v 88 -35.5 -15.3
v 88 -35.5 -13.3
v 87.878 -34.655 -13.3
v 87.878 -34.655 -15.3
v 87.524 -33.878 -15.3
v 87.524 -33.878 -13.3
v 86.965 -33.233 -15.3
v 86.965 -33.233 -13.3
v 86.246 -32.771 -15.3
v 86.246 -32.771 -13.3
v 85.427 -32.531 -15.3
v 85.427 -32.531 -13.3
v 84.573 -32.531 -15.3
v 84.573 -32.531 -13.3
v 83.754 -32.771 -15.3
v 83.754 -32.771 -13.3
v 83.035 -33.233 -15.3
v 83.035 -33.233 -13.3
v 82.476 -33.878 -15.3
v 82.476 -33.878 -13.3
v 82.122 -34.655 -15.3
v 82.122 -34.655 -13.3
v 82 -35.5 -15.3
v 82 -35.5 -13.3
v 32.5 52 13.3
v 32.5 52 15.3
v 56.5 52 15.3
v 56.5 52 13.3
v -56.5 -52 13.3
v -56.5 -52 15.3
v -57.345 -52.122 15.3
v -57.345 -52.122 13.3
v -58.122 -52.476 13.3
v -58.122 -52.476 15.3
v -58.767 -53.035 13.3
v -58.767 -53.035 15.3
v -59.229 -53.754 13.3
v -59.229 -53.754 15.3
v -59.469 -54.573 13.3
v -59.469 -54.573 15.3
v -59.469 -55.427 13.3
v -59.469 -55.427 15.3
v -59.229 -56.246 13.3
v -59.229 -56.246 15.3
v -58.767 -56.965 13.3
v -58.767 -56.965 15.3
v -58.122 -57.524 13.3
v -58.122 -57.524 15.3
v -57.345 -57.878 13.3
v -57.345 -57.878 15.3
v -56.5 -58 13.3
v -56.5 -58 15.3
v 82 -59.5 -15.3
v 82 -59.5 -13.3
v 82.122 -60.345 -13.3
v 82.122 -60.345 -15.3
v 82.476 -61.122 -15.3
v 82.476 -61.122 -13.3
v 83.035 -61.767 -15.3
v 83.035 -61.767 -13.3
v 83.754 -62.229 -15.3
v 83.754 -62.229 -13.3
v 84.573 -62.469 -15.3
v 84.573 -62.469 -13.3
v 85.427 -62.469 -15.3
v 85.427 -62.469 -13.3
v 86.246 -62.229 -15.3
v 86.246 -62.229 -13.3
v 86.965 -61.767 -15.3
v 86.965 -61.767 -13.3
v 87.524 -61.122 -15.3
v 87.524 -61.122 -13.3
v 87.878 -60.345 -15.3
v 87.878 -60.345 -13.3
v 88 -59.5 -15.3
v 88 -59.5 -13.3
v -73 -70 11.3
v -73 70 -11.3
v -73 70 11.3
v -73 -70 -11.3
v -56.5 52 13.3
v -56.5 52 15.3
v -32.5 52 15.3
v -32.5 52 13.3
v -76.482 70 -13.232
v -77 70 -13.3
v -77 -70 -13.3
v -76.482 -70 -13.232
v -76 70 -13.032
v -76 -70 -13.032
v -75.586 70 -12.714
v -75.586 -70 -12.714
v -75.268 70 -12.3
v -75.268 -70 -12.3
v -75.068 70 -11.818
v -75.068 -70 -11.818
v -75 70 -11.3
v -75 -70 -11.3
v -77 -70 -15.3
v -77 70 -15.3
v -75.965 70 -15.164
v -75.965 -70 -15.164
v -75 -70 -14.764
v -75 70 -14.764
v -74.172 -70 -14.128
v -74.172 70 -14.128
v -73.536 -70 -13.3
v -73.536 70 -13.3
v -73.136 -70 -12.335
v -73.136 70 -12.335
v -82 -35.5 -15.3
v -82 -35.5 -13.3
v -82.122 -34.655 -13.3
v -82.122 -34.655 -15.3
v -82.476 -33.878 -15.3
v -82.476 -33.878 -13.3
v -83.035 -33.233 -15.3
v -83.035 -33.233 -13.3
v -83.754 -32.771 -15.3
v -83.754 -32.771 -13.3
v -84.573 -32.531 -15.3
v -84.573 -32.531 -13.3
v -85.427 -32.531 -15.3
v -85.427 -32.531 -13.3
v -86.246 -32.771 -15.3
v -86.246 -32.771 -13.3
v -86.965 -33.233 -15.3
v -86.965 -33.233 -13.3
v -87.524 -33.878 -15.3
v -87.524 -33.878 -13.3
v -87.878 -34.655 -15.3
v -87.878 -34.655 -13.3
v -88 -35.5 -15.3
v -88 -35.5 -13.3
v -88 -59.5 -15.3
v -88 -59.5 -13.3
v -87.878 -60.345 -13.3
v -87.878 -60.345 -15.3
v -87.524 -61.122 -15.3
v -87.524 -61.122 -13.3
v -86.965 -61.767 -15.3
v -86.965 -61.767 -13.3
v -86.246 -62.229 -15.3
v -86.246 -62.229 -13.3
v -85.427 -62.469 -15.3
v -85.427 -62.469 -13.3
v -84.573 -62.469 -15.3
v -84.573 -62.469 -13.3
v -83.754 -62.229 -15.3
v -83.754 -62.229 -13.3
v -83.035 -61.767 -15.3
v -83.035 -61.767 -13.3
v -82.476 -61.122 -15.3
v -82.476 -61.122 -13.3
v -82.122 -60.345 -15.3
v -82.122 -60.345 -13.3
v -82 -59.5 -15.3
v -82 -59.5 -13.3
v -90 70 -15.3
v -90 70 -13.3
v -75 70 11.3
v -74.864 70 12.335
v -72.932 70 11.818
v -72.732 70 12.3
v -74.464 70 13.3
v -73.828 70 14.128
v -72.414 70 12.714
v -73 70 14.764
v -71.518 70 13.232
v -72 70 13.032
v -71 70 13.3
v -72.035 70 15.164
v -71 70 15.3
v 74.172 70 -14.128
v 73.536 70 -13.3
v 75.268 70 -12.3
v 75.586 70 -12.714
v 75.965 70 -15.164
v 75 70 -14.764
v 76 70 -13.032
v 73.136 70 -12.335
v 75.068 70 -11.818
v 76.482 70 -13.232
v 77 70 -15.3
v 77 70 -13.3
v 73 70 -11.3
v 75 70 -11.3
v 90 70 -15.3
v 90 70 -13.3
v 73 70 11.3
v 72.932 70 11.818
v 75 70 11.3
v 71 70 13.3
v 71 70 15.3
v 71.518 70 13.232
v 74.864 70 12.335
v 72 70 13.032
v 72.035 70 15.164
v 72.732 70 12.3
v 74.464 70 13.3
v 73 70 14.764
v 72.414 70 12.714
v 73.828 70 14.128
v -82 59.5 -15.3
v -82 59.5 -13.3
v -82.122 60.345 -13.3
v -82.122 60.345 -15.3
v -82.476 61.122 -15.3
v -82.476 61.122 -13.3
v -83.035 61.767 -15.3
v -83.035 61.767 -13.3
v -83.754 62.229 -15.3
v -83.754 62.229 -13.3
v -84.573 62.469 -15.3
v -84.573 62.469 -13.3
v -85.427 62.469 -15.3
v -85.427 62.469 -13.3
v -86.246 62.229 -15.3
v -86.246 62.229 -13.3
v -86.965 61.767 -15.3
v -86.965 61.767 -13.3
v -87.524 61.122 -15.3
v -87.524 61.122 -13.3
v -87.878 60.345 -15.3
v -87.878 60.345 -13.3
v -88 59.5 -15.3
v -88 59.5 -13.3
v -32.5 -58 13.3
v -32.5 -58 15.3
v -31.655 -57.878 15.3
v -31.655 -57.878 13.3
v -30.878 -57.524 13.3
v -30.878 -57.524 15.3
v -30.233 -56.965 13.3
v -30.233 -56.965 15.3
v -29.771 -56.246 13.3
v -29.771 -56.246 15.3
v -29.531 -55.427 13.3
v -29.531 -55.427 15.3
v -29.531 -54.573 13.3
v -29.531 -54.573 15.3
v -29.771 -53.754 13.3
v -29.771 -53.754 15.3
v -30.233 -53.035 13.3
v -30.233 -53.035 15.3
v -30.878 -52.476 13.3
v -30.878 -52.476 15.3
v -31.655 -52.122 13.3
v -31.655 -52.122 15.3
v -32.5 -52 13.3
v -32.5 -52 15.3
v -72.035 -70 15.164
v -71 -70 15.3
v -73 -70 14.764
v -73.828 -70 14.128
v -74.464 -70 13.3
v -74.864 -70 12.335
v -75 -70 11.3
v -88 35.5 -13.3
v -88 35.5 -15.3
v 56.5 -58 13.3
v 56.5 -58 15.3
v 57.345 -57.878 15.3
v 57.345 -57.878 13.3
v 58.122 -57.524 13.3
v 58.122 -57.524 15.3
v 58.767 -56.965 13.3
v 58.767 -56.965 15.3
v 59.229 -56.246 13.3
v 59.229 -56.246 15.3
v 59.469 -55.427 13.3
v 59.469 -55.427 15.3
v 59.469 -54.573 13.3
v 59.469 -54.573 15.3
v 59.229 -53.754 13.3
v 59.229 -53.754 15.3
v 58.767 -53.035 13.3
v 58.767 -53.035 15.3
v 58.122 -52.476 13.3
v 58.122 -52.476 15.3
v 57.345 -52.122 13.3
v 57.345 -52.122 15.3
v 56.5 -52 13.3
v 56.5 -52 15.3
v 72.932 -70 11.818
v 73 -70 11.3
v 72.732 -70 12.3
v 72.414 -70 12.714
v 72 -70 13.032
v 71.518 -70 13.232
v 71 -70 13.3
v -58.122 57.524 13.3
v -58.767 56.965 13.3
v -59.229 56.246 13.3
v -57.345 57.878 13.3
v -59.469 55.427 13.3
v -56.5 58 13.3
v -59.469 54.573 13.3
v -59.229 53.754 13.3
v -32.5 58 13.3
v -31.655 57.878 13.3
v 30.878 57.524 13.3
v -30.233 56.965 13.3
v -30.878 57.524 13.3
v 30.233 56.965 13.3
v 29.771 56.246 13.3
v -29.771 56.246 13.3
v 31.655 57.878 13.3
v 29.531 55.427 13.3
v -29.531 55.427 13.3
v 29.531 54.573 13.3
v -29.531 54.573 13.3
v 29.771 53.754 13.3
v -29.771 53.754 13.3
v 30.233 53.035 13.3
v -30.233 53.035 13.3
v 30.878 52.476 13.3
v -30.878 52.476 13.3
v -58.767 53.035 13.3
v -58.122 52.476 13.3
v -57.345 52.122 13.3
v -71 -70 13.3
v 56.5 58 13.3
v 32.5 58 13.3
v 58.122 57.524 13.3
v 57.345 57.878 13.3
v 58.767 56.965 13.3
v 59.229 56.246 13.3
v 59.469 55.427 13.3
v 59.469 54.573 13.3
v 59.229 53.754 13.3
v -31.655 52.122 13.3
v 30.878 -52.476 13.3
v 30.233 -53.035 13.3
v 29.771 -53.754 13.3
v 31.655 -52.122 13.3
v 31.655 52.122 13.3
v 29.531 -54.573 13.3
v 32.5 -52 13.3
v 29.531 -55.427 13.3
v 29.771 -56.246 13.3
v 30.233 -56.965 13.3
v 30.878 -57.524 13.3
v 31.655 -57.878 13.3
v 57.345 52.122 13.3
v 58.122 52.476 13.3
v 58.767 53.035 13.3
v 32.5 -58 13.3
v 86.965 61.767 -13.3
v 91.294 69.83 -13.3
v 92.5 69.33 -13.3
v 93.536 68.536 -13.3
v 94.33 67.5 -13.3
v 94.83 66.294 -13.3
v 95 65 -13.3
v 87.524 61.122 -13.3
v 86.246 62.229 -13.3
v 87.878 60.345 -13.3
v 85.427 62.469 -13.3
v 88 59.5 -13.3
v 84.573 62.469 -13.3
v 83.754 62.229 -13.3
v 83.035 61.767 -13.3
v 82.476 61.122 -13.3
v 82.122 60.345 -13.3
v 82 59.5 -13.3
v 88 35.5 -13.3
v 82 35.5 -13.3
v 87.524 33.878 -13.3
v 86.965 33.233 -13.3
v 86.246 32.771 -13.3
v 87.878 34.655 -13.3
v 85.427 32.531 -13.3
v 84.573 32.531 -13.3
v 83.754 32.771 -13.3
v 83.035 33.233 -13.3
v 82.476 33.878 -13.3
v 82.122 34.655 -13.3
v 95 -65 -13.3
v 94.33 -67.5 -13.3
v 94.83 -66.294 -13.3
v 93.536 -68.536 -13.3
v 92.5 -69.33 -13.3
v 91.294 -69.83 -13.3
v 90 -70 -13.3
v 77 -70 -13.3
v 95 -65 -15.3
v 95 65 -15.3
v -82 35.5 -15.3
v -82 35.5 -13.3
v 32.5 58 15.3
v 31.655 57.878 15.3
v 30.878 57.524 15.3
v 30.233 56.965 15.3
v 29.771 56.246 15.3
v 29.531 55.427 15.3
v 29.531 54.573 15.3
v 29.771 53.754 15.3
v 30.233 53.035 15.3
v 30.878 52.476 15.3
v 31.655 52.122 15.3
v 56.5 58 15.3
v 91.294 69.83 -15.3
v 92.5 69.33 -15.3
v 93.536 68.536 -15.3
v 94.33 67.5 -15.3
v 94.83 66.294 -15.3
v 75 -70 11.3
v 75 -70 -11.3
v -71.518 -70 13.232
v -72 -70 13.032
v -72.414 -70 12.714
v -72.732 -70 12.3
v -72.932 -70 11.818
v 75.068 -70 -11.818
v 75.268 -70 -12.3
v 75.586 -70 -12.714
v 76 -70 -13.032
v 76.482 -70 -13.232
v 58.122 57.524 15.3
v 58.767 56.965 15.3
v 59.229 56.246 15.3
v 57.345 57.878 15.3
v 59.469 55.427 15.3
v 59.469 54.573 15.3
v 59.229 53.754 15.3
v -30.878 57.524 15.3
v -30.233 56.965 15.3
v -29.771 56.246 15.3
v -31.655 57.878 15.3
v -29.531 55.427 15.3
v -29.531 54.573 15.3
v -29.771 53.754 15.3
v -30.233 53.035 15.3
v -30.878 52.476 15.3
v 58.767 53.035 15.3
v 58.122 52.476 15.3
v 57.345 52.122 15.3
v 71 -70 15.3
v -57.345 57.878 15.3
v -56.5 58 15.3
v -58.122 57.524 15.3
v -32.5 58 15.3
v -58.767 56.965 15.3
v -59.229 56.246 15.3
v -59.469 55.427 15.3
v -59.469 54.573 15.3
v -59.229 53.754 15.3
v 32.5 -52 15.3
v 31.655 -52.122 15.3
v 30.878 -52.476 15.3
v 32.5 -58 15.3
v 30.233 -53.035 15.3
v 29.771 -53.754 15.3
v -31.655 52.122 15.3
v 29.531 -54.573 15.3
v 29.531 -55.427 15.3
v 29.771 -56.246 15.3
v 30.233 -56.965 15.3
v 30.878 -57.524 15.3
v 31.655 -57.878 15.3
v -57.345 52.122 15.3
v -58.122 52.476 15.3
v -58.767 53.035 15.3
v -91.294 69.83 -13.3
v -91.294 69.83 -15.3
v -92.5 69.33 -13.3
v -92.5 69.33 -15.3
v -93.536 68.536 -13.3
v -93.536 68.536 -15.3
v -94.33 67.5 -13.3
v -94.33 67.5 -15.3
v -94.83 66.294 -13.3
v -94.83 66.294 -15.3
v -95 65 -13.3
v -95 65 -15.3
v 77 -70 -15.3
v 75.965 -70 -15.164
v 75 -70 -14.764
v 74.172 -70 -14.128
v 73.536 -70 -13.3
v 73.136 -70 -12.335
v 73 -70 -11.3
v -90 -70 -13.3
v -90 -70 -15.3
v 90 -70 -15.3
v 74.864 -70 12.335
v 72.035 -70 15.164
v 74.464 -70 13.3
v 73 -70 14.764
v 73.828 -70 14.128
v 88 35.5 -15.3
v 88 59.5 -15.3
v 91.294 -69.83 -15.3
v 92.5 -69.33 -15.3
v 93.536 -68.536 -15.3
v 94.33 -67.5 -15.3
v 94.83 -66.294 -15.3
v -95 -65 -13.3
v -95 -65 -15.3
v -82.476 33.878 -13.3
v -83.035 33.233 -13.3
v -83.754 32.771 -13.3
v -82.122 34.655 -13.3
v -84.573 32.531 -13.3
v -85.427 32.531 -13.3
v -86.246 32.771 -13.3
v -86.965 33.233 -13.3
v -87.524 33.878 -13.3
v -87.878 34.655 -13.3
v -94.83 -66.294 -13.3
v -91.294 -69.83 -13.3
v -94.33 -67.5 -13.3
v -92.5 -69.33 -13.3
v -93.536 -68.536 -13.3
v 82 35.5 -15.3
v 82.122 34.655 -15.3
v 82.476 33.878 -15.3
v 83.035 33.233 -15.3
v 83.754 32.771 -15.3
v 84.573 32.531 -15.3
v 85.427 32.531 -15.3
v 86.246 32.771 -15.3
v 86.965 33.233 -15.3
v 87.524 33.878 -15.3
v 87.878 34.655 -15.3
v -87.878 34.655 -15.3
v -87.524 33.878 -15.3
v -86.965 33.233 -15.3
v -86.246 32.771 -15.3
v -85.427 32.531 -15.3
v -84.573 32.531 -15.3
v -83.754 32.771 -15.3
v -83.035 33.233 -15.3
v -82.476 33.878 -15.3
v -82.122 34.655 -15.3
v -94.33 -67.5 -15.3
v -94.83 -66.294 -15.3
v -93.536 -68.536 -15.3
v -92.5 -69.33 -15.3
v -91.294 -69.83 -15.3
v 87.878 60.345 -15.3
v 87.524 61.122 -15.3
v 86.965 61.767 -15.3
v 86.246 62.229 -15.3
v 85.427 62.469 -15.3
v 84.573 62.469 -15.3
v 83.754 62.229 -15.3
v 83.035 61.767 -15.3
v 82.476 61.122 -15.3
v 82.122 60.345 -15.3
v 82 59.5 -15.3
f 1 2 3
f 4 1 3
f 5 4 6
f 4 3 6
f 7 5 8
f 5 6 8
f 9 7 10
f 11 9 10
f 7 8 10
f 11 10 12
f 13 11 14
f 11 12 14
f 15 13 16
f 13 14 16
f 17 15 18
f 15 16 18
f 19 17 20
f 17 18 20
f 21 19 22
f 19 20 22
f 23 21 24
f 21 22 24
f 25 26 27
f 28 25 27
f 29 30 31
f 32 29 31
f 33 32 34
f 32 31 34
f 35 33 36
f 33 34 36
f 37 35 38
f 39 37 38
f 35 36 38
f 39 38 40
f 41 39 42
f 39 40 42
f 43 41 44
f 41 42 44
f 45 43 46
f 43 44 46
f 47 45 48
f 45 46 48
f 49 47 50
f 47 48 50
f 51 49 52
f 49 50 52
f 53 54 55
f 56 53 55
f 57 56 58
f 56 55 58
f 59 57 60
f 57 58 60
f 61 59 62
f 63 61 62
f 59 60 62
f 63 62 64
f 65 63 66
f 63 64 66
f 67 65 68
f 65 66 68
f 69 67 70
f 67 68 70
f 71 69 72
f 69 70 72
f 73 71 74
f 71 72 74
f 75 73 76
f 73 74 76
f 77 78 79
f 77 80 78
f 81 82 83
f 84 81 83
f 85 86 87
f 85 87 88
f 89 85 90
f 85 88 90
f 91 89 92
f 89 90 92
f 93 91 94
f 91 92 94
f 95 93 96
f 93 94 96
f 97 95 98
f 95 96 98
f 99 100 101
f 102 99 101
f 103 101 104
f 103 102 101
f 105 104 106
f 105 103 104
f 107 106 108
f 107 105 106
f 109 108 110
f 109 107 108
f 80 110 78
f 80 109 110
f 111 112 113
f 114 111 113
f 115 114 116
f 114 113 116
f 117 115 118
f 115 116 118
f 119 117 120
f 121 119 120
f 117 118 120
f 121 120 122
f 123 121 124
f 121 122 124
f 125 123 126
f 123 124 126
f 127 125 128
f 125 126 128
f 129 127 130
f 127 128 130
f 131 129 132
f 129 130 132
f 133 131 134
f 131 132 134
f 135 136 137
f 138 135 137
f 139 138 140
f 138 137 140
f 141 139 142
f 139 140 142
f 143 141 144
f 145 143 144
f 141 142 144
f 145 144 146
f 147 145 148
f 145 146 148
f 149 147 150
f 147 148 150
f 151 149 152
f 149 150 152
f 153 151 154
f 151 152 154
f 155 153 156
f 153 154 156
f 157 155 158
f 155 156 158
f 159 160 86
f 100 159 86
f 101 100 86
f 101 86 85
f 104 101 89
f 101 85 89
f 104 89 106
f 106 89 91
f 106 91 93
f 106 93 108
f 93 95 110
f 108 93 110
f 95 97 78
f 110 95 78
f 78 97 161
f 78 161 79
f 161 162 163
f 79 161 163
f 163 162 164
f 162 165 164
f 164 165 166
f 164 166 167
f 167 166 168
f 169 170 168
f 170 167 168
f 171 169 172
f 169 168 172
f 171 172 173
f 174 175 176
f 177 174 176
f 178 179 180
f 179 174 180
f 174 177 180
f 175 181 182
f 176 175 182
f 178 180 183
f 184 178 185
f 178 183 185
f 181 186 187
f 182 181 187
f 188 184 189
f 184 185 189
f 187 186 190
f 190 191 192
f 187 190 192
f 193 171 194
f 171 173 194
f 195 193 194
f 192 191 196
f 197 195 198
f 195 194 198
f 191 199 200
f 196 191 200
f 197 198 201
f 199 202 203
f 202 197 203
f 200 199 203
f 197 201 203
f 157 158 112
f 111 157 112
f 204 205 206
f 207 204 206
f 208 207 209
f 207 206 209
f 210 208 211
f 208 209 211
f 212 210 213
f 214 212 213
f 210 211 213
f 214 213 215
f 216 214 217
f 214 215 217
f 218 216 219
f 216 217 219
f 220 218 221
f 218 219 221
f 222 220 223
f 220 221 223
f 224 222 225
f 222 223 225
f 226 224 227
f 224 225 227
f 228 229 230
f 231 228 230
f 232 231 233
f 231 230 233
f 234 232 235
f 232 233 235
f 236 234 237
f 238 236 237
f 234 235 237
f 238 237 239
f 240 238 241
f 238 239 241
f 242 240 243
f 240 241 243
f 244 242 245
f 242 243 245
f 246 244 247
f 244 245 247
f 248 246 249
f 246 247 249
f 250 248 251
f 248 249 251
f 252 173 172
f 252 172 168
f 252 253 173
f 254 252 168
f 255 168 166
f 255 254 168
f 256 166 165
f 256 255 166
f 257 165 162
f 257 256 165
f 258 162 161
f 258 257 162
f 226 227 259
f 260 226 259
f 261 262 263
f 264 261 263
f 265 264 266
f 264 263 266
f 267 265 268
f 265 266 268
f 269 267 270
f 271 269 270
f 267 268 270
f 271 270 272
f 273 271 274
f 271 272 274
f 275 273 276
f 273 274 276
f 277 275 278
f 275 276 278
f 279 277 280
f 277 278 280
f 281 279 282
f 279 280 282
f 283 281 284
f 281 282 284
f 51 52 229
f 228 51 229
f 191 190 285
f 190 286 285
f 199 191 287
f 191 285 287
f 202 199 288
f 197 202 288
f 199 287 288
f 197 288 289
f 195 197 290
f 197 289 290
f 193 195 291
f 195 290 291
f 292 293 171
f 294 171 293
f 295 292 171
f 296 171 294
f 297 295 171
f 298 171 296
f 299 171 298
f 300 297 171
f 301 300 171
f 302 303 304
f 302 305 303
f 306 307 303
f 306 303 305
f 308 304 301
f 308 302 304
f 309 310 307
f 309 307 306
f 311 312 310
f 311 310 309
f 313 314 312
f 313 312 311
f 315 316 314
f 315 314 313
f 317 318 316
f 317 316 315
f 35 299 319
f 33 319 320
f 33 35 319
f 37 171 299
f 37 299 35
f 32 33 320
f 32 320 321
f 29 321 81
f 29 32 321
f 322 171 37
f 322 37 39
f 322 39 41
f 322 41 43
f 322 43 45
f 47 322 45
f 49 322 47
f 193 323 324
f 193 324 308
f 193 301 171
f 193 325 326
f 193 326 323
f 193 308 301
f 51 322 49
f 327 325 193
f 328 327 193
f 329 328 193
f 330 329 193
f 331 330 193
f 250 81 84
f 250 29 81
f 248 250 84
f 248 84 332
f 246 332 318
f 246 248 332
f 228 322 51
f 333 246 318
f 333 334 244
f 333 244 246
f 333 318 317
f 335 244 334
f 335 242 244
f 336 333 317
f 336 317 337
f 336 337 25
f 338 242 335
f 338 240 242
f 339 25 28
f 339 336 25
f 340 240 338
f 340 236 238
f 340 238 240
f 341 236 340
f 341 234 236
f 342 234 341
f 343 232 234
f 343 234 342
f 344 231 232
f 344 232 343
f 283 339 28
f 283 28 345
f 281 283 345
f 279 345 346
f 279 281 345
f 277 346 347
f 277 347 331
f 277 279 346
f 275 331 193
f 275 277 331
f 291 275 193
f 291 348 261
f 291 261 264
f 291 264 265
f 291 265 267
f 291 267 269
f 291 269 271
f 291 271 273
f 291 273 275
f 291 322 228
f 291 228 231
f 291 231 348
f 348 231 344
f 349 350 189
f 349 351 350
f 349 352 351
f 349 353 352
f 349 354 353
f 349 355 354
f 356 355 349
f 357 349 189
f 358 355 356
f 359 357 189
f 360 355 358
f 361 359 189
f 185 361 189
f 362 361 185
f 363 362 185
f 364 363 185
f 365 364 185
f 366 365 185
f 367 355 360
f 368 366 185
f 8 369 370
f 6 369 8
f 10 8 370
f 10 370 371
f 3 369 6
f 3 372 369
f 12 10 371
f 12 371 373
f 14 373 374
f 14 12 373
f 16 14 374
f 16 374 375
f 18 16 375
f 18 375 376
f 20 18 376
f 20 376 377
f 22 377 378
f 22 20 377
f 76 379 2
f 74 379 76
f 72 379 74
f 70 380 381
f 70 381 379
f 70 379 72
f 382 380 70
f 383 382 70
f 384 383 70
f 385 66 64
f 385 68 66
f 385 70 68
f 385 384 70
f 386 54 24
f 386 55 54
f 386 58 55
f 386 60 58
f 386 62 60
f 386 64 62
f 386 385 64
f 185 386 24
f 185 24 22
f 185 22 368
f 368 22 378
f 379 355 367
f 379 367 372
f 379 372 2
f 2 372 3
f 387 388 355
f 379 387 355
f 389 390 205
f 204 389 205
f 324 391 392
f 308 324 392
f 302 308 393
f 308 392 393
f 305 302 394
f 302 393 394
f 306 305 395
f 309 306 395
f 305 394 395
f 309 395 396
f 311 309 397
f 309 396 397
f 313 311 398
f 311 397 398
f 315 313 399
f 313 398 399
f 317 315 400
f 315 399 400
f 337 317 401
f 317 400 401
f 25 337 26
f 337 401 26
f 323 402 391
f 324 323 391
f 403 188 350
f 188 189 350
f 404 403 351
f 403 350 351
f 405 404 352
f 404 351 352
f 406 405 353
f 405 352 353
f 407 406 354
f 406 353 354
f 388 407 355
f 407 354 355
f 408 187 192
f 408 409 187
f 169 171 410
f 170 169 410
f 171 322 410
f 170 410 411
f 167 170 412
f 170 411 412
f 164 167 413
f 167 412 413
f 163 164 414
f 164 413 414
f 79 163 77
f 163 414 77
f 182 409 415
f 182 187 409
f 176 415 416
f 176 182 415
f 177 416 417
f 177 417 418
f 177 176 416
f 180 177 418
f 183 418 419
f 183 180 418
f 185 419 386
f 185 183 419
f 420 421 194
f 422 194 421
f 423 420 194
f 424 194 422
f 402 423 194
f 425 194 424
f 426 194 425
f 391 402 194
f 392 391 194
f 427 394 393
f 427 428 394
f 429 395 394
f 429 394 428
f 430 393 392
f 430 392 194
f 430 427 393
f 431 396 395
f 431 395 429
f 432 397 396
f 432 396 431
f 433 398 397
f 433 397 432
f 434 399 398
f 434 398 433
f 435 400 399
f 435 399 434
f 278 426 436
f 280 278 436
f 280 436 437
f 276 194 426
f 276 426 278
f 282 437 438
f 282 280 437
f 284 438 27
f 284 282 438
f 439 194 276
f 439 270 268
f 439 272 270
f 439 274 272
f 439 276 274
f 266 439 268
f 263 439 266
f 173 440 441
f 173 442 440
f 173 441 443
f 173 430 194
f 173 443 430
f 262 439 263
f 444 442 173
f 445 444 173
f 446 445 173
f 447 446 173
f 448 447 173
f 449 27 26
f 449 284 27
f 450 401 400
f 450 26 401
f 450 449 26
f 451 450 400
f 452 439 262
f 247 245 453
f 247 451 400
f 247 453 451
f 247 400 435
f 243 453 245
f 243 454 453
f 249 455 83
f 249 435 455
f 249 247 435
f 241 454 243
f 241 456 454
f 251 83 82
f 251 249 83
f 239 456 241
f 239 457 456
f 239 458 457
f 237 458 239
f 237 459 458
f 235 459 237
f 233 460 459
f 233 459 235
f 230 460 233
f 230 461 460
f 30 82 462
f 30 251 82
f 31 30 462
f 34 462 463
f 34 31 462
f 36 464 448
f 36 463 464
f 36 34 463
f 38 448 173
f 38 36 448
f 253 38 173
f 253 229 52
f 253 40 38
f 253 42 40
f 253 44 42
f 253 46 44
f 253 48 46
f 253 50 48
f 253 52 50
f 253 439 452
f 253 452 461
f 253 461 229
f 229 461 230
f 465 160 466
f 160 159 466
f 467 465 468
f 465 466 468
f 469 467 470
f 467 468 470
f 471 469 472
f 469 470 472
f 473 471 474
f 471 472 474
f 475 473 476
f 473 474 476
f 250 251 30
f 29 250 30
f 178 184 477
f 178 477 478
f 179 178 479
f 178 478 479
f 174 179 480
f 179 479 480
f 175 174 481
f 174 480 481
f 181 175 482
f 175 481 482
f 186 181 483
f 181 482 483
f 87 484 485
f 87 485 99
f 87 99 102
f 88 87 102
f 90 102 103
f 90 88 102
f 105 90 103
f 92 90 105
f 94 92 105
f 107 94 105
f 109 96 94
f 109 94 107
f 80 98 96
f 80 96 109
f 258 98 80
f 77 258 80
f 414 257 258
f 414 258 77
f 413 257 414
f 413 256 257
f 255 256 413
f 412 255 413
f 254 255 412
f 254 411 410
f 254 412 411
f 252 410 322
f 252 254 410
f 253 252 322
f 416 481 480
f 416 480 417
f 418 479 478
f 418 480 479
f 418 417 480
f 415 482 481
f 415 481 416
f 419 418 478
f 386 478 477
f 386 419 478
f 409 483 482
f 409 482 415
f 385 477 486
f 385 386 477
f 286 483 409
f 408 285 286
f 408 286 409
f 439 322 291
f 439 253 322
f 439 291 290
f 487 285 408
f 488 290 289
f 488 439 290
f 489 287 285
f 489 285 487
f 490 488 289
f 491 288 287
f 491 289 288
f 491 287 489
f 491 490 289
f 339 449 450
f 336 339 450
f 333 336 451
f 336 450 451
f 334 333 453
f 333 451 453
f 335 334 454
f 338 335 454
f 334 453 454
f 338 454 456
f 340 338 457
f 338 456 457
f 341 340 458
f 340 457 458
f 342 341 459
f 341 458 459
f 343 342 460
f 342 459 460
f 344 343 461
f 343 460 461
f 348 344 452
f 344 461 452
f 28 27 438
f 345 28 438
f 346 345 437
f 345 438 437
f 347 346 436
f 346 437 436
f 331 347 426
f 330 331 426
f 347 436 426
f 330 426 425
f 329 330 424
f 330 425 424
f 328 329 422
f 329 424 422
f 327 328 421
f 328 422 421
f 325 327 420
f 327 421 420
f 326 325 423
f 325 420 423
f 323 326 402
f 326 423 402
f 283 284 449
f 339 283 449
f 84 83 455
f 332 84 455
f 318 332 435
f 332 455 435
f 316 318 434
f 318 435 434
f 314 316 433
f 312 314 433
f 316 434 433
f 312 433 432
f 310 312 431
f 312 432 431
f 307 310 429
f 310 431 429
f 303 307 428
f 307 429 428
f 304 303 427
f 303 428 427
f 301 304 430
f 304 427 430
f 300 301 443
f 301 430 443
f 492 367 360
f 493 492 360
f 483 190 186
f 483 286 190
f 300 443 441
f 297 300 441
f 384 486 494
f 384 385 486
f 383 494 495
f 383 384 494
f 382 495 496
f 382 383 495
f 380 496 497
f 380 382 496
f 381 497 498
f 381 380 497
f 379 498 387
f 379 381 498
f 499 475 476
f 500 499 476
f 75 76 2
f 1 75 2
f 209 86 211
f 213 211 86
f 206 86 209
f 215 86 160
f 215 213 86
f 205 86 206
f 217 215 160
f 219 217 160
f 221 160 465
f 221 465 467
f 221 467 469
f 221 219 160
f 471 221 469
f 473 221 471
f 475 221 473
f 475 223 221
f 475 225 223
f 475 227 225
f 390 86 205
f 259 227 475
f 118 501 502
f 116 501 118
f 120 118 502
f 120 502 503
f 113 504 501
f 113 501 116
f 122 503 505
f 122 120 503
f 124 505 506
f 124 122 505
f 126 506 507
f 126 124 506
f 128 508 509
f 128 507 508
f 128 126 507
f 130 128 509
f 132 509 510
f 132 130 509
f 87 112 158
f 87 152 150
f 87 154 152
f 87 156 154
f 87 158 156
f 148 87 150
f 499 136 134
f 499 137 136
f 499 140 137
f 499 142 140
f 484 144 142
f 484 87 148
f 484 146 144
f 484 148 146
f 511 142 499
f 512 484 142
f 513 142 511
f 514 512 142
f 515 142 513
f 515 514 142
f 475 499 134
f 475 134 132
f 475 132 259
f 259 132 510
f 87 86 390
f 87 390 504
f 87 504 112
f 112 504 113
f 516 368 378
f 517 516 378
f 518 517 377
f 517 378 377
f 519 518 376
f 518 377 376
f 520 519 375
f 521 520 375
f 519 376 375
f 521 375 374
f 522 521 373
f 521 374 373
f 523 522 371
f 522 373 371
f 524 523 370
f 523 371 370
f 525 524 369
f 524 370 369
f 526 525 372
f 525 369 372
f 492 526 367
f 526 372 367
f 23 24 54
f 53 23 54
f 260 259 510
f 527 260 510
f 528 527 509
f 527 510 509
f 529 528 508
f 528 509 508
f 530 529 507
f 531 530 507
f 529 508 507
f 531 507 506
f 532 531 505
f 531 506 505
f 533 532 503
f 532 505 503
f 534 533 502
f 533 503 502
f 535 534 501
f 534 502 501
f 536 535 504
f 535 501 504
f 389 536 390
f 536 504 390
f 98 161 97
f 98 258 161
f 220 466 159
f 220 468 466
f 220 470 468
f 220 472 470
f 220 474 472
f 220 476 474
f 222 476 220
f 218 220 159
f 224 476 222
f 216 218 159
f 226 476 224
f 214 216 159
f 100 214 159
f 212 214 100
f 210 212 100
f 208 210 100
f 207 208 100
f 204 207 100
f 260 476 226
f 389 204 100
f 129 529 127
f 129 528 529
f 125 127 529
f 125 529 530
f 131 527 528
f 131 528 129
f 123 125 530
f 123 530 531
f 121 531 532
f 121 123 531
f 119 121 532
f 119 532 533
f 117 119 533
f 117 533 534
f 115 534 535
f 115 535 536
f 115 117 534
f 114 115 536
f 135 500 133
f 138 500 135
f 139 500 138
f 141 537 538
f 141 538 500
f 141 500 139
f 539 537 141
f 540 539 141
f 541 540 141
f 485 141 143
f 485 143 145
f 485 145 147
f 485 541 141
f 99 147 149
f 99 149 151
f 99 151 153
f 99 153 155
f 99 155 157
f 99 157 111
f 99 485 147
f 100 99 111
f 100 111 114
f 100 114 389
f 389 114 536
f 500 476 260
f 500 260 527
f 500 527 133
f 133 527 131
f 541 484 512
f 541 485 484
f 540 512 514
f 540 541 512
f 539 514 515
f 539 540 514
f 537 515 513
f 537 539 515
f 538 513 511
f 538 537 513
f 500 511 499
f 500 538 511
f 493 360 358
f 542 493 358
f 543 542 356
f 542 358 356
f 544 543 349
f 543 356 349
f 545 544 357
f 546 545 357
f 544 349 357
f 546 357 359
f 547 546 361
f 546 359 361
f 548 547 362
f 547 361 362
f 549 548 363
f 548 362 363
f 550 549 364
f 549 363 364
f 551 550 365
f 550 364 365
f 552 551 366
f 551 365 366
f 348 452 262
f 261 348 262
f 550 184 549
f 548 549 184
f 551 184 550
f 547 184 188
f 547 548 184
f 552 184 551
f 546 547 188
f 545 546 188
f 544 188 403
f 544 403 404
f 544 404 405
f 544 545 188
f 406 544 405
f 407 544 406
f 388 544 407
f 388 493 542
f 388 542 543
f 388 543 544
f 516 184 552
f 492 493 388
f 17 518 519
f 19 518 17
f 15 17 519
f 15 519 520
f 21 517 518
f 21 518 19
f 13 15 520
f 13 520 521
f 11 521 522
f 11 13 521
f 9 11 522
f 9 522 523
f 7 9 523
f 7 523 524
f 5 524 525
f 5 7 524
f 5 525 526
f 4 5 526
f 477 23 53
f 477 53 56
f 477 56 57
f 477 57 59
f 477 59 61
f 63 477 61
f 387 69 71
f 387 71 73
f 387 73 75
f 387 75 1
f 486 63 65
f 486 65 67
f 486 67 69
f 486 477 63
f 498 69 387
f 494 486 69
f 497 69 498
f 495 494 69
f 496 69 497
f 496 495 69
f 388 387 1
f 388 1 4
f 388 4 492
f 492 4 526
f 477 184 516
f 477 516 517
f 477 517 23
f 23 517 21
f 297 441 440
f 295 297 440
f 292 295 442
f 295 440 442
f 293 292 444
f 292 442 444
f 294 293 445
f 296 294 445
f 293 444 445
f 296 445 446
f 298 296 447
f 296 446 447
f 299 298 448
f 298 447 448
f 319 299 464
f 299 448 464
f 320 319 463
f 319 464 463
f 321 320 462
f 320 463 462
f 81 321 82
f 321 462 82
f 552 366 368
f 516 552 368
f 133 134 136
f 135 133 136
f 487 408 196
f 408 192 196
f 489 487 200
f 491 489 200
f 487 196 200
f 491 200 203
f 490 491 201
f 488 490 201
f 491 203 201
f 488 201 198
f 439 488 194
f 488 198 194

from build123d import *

# Parameters (mm, degrees)
F1_DEPTH = 70
F2_R     = 2
F3_R     = 4
F5_DEPTH = 25
F6_R     = 5
F8_DEPTH = 25


with BuildPart() as f1:
    # F0 (on Front) → F1 (new body, symmetric)
    with BuildSketch(Plane.XZ):
        Polygon((75, 15.3), (-75, 15.3), (-75, -13.3), (-95, -13.3), (-95, -15.3), (-75, -15.3), (-73, -15.3), (-73, -13.3), (-73, 13.3), (73, 13.3), (73, -13.3), (73, -15.3), (75, -15.3), (95, -15.3), (95, -13.3), (75, -13.3), align=None)
    extrude(amount=F1_DEPTH, both=True)

    # F2
    f2_edges = [f1.edges().sort_by_distance(p)[0] for p in [
        (-73, 0, 13.3),
        (73, 0, 13.3),
        (75, 0, -13.3),
        (-75, 0, -13.3),
    ]]
    fillet(f2_edges, radius=F2_R)

    # F3
    f3_edges = [f1.edges().sort_by_distance(p)[0] for p in [
        (-75, 0, 15.3),
        (-73, 0, -15.3),
        (73, 0, -15.3),
        (75, 0, 15.3),
    ]]
    fillet(f3_edges, radius=F3_R)

    # F4 (on face) → F5 (cut)
    with BuildSketch(Plane.XY.offset(-13.3)):
        with BuildLine():
            Line((-82, 35.5), (-82, 59.5))
            ThreePointArc((-82, 59.5), (-85, 62.5), (-88, 59.5))
            Line((-88, 59.5), (-88, 35.5))
            ThreePointArc((-88, 35.5), (-85, 32.5), (-82, 35.5))
        make_face()
        with BuildLine():
            Line((-88, -35.5), (-88, -59.5))
            ThreePointArc((-88, -59.5), (-85, -62.5), (-82, -59.5))
            Line((-82, -59.5), (-82, -35.5))
            ThreePointArc((-82, -35.5), (-85, -32.5), (-88, -35.5))
        make_face()
        with BuildLine():
            Line((82, -35.5), (82, -59.5))
            ThreePointArc((82, -59.5), (85, -62.5), (88, -59.5))
            Line((88, -59.5), (88, -35.5))
            ThreePointArc((88, -35.5), (85, -32.5), (82, -35.5))
        make_face()
        with BuildLine():
            ThreePointArc((88, 59.5), (85, 62.5), (82, 59.5))
            Line((82, 59.5), (82, 35.5))
            ThreePointArc((82, 35.5), (85, 32.5), (88, 35.5))
            Line((88, 35.5), (88, 59.5))
        make_face()
    extrude(amount=-F5_DEPTH, mode=Mode.SUBTRACT)

    # F6
    f6_edges = [f1.edges().sort_by_distance(p)[0] for p in [
        (-95, 70, -14.3),
        (95, 70, -14.3),
        (-95, -70, -14.3),
        (95, -70, -14.3),
    ]]
    fillet(f6_edges, radius=F6_R)

    # F7 (on face) → F8 (cut)
    with BuildSketch(Plane.XY.offset(15.3)):
        with BuildLine():
            Line((-56.5, 52), (-32.5, 52))
            ThreePointArc((-32.5, 52), (-29.5, 55), (-32.5, 58))
            Line((-32.5, 58), (-56.5, 58))
            ThreePointArc((-56.5, 58), (-59.5, 55), (-56.5, 52))
        make_face()
        with BuildLine():
            ThreePointArc((32.5, 58), (29.5, 55), (32.5, 52))
            Line((32.5, 52), (56.5, 52))
            ThreePointArc((56.5, 52), (59.5, 55), (56.5, 58))
            Line((56.5, 58), (32.5, 58))
        make_face()
        with BuildLine():
            Line((32.5, -58), (56.5, -58))
            ThreePointArc((56.5, -58), (59.5, -55), (56.5, -52))
            Line((56.5, -52), (32.5, -52))
            ThreePointArc((32.5, -52), (29.5, -55), (32.5, -58))
        make_face()
        with BuildLine():
            ThreePointArc((-32.5, -58), (-29.5, -55), (-32.5, -52))
            Line((-32.5, -52), (-56.5, -52))
            ThreePointArc((-56.5, -52), (-59.5, -55), (-56.5, -58))
            Line((-56.5, -58), (-32.5, -58))
        make_face()
    extrude(amount=-F8_DEPTH, mode=Mode.SUBTRACT)


solid = f1.part
